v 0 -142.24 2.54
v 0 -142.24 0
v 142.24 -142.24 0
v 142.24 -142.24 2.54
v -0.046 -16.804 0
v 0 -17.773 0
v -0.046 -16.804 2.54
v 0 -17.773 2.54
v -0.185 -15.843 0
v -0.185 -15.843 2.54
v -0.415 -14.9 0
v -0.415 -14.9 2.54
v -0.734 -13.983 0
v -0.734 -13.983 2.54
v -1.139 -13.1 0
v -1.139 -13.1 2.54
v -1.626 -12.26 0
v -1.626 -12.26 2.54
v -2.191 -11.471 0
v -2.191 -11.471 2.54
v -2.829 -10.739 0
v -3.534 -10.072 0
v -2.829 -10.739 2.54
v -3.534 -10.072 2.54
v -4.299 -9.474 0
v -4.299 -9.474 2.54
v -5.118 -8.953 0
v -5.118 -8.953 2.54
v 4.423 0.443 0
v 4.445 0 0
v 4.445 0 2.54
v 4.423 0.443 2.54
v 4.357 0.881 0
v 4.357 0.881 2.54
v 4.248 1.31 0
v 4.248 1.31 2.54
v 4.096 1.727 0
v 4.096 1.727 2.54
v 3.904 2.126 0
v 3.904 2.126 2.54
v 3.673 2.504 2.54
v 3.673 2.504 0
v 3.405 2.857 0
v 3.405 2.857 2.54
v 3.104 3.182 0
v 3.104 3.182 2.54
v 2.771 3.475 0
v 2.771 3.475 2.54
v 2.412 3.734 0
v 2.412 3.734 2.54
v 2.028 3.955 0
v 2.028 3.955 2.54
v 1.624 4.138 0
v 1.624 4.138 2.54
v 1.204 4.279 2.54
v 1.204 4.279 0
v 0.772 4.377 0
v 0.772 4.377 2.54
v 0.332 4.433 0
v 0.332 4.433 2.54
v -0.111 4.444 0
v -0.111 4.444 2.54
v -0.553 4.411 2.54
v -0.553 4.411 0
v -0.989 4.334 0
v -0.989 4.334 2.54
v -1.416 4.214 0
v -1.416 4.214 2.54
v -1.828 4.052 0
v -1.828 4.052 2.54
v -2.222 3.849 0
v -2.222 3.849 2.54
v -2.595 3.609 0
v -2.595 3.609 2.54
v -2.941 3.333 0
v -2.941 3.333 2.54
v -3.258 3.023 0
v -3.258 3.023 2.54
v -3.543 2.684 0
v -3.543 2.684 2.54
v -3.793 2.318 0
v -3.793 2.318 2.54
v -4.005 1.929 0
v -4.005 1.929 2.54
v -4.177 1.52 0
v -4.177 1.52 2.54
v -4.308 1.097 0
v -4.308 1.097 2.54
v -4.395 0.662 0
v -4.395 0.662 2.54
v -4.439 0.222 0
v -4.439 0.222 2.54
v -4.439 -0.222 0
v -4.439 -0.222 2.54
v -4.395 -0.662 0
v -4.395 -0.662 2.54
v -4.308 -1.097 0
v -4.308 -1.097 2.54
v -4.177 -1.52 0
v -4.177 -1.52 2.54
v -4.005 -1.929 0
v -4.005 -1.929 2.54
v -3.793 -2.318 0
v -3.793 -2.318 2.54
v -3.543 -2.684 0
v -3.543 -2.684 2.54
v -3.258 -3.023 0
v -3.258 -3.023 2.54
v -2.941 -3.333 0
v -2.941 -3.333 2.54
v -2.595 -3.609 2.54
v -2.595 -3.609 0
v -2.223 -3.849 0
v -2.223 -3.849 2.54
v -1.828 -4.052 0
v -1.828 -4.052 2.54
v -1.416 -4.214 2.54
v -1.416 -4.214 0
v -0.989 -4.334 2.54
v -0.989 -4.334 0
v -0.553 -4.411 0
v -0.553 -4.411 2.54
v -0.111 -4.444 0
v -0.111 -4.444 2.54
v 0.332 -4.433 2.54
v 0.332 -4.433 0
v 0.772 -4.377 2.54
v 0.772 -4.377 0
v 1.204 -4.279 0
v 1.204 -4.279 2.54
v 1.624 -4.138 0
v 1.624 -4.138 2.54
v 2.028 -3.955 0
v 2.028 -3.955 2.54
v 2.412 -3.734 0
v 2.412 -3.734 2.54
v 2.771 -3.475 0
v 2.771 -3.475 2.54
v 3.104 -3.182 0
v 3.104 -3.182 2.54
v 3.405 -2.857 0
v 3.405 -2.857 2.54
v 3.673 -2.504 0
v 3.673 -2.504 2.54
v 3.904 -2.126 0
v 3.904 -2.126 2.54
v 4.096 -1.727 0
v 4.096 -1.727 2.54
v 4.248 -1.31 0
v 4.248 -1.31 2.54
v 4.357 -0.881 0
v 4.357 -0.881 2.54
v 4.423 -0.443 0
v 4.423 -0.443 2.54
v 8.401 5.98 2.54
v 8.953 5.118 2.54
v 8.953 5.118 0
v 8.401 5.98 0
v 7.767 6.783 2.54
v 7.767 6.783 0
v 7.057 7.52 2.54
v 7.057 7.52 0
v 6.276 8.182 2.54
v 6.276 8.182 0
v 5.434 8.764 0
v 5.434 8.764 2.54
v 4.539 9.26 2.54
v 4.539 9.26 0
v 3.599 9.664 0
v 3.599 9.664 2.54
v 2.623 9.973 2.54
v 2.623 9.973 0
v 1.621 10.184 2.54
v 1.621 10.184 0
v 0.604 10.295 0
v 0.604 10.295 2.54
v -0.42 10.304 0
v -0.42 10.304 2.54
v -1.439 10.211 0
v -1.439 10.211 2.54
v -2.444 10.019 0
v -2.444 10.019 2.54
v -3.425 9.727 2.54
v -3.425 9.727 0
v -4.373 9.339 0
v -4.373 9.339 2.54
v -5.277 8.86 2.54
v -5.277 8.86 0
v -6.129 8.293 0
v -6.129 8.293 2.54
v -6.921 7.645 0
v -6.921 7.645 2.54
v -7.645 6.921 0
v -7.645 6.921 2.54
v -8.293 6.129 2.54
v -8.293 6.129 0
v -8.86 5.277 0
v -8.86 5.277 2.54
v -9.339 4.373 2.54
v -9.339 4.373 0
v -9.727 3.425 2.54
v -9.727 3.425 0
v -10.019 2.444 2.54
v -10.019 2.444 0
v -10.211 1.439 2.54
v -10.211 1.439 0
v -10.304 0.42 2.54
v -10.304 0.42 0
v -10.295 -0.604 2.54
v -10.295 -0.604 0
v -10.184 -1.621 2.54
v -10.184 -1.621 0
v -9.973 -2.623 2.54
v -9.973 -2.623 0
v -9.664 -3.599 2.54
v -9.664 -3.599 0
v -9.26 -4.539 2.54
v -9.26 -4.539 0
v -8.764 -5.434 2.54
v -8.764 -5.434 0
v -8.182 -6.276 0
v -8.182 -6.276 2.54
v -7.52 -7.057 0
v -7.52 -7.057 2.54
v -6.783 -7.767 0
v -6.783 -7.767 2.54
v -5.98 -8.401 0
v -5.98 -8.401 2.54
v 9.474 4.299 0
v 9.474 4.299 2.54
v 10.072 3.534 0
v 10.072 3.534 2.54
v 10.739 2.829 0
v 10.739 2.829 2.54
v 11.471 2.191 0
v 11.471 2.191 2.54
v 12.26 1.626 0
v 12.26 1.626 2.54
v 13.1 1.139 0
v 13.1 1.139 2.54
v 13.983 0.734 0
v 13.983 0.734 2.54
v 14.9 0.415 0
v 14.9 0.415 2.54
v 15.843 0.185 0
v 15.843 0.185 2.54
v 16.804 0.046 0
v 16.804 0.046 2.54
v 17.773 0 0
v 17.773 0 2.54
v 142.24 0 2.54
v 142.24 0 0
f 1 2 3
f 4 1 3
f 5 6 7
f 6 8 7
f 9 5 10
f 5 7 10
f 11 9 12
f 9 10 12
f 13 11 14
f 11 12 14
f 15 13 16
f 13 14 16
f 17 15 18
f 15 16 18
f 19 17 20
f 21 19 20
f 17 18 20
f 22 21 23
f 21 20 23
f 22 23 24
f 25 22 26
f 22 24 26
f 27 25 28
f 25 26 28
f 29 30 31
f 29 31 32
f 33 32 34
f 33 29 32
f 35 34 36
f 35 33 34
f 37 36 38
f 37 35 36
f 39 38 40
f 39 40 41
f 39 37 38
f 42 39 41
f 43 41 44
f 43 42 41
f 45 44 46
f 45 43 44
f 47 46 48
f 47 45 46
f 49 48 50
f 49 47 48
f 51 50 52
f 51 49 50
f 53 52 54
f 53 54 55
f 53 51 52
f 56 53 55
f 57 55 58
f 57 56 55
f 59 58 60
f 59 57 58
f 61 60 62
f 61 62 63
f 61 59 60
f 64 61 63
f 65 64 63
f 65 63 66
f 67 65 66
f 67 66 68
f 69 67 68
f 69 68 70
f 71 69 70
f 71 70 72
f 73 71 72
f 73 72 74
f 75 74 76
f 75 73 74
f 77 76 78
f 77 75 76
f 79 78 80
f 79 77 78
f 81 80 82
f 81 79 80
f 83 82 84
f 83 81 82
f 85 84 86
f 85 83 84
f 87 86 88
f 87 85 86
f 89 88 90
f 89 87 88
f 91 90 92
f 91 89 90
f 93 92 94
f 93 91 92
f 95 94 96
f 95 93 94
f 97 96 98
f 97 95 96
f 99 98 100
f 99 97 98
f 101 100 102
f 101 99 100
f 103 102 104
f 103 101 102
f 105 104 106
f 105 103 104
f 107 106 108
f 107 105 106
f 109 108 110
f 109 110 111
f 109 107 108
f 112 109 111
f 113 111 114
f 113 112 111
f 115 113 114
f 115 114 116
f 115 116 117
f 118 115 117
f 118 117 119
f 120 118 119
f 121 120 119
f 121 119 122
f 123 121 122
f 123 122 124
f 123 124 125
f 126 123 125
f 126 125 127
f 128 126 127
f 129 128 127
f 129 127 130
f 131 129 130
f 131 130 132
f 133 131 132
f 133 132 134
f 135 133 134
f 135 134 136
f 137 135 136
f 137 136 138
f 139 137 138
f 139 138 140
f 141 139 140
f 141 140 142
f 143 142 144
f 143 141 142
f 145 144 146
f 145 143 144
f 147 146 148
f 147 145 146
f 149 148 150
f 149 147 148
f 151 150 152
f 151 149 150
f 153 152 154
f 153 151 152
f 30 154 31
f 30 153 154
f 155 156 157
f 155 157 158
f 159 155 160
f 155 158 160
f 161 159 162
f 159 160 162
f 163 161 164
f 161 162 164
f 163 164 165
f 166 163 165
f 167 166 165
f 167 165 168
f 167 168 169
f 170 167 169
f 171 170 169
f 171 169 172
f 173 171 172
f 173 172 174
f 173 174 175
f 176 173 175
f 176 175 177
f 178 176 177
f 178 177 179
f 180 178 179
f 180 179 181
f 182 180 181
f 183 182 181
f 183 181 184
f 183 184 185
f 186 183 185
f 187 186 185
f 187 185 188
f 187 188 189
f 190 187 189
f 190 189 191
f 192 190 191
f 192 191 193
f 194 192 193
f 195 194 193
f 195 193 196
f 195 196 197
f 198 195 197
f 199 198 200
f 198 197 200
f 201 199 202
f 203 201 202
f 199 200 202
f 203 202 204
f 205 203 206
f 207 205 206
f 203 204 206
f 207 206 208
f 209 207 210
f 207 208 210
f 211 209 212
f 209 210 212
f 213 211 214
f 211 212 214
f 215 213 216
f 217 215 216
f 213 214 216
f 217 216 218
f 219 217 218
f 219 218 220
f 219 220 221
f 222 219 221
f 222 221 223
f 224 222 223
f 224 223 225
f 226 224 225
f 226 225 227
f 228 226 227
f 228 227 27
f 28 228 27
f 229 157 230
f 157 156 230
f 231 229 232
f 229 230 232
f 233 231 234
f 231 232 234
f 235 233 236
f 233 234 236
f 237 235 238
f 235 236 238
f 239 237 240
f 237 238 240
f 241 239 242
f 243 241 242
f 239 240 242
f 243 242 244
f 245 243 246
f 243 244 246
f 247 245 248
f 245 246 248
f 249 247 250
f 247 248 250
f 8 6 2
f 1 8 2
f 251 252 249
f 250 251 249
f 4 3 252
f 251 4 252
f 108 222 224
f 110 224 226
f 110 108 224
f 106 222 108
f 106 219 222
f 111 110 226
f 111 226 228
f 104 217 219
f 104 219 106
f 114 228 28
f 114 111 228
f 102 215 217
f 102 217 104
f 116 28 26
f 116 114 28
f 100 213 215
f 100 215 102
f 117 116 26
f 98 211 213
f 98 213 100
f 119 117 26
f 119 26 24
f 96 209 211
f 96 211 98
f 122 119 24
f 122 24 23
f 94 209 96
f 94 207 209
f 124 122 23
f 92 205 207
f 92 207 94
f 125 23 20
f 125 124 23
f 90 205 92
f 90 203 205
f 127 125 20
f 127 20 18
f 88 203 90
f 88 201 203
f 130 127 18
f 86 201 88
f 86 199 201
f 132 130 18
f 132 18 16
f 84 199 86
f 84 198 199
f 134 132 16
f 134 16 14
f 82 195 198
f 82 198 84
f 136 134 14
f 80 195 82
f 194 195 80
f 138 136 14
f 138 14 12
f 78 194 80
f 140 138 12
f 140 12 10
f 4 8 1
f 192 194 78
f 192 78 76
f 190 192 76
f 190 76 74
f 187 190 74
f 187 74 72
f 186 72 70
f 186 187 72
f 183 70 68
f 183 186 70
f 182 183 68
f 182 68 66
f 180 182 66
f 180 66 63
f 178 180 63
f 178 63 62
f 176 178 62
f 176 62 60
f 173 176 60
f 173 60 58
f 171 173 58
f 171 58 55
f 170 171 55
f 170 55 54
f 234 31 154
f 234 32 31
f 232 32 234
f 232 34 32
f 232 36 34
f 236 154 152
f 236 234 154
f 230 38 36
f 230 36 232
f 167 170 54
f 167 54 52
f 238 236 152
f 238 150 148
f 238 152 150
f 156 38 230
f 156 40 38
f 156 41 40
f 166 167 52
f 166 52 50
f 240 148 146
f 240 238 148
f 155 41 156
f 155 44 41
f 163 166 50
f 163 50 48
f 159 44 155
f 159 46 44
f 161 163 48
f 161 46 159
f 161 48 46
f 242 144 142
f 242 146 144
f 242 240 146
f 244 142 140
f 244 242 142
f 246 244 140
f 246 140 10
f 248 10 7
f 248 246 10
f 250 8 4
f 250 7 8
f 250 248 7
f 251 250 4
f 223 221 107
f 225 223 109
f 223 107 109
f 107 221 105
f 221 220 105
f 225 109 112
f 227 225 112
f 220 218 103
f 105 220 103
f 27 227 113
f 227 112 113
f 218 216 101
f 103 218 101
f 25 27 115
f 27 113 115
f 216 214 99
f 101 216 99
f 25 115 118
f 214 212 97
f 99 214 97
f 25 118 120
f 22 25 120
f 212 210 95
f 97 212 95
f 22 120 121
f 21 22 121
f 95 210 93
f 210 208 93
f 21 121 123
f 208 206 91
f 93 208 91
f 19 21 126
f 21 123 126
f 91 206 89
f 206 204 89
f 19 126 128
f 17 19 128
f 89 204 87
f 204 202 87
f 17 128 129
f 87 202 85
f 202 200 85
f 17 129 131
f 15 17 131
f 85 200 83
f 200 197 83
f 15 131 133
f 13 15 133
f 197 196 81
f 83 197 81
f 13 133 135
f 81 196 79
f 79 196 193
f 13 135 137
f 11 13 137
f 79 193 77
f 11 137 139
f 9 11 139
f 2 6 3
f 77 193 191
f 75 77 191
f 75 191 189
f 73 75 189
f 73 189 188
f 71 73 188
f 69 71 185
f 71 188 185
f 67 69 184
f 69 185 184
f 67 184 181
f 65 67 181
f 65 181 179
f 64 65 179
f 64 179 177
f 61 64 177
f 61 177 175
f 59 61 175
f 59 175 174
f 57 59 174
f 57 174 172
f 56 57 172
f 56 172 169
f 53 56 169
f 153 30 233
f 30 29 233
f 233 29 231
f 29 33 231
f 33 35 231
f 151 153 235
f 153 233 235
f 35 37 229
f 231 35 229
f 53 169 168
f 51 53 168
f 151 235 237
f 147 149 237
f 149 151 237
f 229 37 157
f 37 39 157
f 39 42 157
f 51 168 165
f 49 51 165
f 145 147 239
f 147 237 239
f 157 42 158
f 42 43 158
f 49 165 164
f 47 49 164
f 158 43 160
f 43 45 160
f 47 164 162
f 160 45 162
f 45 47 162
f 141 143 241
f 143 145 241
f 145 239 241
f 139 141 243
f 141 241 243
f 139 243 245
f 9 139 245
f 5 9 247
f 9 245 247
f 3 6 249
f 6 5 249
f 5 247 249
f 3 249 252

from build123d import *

# Parameters (mm, degrees)
SKETCH1_R           = 4.445
BOSS_EXTRUDE1_DEPTH = 2.54
FILLET1_R           = 10.16


with BuildPart() as part:
    # Sketch1 → Boss-Extrude1 (new body)
    with BuildSketch(Plane.XY):
        with BuildLine():
            Line((0, -10.3124), (0, -142.24))
            Line((0, -142.24), (142.24, -142.24))
            Line((142.24, -142.24), (142.24, 0))
            Line((142.24, 0), (10.3124, 0))
            ThreePointArc((10.3124, 0), (-7.29196797, 7.29196797), (0, -10.3124))
        make_face()
        Circle(SKETCH1_R, mode=Mode.SUBTRACT)
    extrude(amount=BOSS_EXTRUDE1_DEPTH)

    # Fillet1
    fillet1_edges = [part.edges().sort_by_distance(p)[0] for p in [
        (0, -10.3124, 1.27),
        (10.3124, 0, 1.27),
    ]]
    fillet(fillet1_edges, radius=FILLET1_R)


solid = part.part
